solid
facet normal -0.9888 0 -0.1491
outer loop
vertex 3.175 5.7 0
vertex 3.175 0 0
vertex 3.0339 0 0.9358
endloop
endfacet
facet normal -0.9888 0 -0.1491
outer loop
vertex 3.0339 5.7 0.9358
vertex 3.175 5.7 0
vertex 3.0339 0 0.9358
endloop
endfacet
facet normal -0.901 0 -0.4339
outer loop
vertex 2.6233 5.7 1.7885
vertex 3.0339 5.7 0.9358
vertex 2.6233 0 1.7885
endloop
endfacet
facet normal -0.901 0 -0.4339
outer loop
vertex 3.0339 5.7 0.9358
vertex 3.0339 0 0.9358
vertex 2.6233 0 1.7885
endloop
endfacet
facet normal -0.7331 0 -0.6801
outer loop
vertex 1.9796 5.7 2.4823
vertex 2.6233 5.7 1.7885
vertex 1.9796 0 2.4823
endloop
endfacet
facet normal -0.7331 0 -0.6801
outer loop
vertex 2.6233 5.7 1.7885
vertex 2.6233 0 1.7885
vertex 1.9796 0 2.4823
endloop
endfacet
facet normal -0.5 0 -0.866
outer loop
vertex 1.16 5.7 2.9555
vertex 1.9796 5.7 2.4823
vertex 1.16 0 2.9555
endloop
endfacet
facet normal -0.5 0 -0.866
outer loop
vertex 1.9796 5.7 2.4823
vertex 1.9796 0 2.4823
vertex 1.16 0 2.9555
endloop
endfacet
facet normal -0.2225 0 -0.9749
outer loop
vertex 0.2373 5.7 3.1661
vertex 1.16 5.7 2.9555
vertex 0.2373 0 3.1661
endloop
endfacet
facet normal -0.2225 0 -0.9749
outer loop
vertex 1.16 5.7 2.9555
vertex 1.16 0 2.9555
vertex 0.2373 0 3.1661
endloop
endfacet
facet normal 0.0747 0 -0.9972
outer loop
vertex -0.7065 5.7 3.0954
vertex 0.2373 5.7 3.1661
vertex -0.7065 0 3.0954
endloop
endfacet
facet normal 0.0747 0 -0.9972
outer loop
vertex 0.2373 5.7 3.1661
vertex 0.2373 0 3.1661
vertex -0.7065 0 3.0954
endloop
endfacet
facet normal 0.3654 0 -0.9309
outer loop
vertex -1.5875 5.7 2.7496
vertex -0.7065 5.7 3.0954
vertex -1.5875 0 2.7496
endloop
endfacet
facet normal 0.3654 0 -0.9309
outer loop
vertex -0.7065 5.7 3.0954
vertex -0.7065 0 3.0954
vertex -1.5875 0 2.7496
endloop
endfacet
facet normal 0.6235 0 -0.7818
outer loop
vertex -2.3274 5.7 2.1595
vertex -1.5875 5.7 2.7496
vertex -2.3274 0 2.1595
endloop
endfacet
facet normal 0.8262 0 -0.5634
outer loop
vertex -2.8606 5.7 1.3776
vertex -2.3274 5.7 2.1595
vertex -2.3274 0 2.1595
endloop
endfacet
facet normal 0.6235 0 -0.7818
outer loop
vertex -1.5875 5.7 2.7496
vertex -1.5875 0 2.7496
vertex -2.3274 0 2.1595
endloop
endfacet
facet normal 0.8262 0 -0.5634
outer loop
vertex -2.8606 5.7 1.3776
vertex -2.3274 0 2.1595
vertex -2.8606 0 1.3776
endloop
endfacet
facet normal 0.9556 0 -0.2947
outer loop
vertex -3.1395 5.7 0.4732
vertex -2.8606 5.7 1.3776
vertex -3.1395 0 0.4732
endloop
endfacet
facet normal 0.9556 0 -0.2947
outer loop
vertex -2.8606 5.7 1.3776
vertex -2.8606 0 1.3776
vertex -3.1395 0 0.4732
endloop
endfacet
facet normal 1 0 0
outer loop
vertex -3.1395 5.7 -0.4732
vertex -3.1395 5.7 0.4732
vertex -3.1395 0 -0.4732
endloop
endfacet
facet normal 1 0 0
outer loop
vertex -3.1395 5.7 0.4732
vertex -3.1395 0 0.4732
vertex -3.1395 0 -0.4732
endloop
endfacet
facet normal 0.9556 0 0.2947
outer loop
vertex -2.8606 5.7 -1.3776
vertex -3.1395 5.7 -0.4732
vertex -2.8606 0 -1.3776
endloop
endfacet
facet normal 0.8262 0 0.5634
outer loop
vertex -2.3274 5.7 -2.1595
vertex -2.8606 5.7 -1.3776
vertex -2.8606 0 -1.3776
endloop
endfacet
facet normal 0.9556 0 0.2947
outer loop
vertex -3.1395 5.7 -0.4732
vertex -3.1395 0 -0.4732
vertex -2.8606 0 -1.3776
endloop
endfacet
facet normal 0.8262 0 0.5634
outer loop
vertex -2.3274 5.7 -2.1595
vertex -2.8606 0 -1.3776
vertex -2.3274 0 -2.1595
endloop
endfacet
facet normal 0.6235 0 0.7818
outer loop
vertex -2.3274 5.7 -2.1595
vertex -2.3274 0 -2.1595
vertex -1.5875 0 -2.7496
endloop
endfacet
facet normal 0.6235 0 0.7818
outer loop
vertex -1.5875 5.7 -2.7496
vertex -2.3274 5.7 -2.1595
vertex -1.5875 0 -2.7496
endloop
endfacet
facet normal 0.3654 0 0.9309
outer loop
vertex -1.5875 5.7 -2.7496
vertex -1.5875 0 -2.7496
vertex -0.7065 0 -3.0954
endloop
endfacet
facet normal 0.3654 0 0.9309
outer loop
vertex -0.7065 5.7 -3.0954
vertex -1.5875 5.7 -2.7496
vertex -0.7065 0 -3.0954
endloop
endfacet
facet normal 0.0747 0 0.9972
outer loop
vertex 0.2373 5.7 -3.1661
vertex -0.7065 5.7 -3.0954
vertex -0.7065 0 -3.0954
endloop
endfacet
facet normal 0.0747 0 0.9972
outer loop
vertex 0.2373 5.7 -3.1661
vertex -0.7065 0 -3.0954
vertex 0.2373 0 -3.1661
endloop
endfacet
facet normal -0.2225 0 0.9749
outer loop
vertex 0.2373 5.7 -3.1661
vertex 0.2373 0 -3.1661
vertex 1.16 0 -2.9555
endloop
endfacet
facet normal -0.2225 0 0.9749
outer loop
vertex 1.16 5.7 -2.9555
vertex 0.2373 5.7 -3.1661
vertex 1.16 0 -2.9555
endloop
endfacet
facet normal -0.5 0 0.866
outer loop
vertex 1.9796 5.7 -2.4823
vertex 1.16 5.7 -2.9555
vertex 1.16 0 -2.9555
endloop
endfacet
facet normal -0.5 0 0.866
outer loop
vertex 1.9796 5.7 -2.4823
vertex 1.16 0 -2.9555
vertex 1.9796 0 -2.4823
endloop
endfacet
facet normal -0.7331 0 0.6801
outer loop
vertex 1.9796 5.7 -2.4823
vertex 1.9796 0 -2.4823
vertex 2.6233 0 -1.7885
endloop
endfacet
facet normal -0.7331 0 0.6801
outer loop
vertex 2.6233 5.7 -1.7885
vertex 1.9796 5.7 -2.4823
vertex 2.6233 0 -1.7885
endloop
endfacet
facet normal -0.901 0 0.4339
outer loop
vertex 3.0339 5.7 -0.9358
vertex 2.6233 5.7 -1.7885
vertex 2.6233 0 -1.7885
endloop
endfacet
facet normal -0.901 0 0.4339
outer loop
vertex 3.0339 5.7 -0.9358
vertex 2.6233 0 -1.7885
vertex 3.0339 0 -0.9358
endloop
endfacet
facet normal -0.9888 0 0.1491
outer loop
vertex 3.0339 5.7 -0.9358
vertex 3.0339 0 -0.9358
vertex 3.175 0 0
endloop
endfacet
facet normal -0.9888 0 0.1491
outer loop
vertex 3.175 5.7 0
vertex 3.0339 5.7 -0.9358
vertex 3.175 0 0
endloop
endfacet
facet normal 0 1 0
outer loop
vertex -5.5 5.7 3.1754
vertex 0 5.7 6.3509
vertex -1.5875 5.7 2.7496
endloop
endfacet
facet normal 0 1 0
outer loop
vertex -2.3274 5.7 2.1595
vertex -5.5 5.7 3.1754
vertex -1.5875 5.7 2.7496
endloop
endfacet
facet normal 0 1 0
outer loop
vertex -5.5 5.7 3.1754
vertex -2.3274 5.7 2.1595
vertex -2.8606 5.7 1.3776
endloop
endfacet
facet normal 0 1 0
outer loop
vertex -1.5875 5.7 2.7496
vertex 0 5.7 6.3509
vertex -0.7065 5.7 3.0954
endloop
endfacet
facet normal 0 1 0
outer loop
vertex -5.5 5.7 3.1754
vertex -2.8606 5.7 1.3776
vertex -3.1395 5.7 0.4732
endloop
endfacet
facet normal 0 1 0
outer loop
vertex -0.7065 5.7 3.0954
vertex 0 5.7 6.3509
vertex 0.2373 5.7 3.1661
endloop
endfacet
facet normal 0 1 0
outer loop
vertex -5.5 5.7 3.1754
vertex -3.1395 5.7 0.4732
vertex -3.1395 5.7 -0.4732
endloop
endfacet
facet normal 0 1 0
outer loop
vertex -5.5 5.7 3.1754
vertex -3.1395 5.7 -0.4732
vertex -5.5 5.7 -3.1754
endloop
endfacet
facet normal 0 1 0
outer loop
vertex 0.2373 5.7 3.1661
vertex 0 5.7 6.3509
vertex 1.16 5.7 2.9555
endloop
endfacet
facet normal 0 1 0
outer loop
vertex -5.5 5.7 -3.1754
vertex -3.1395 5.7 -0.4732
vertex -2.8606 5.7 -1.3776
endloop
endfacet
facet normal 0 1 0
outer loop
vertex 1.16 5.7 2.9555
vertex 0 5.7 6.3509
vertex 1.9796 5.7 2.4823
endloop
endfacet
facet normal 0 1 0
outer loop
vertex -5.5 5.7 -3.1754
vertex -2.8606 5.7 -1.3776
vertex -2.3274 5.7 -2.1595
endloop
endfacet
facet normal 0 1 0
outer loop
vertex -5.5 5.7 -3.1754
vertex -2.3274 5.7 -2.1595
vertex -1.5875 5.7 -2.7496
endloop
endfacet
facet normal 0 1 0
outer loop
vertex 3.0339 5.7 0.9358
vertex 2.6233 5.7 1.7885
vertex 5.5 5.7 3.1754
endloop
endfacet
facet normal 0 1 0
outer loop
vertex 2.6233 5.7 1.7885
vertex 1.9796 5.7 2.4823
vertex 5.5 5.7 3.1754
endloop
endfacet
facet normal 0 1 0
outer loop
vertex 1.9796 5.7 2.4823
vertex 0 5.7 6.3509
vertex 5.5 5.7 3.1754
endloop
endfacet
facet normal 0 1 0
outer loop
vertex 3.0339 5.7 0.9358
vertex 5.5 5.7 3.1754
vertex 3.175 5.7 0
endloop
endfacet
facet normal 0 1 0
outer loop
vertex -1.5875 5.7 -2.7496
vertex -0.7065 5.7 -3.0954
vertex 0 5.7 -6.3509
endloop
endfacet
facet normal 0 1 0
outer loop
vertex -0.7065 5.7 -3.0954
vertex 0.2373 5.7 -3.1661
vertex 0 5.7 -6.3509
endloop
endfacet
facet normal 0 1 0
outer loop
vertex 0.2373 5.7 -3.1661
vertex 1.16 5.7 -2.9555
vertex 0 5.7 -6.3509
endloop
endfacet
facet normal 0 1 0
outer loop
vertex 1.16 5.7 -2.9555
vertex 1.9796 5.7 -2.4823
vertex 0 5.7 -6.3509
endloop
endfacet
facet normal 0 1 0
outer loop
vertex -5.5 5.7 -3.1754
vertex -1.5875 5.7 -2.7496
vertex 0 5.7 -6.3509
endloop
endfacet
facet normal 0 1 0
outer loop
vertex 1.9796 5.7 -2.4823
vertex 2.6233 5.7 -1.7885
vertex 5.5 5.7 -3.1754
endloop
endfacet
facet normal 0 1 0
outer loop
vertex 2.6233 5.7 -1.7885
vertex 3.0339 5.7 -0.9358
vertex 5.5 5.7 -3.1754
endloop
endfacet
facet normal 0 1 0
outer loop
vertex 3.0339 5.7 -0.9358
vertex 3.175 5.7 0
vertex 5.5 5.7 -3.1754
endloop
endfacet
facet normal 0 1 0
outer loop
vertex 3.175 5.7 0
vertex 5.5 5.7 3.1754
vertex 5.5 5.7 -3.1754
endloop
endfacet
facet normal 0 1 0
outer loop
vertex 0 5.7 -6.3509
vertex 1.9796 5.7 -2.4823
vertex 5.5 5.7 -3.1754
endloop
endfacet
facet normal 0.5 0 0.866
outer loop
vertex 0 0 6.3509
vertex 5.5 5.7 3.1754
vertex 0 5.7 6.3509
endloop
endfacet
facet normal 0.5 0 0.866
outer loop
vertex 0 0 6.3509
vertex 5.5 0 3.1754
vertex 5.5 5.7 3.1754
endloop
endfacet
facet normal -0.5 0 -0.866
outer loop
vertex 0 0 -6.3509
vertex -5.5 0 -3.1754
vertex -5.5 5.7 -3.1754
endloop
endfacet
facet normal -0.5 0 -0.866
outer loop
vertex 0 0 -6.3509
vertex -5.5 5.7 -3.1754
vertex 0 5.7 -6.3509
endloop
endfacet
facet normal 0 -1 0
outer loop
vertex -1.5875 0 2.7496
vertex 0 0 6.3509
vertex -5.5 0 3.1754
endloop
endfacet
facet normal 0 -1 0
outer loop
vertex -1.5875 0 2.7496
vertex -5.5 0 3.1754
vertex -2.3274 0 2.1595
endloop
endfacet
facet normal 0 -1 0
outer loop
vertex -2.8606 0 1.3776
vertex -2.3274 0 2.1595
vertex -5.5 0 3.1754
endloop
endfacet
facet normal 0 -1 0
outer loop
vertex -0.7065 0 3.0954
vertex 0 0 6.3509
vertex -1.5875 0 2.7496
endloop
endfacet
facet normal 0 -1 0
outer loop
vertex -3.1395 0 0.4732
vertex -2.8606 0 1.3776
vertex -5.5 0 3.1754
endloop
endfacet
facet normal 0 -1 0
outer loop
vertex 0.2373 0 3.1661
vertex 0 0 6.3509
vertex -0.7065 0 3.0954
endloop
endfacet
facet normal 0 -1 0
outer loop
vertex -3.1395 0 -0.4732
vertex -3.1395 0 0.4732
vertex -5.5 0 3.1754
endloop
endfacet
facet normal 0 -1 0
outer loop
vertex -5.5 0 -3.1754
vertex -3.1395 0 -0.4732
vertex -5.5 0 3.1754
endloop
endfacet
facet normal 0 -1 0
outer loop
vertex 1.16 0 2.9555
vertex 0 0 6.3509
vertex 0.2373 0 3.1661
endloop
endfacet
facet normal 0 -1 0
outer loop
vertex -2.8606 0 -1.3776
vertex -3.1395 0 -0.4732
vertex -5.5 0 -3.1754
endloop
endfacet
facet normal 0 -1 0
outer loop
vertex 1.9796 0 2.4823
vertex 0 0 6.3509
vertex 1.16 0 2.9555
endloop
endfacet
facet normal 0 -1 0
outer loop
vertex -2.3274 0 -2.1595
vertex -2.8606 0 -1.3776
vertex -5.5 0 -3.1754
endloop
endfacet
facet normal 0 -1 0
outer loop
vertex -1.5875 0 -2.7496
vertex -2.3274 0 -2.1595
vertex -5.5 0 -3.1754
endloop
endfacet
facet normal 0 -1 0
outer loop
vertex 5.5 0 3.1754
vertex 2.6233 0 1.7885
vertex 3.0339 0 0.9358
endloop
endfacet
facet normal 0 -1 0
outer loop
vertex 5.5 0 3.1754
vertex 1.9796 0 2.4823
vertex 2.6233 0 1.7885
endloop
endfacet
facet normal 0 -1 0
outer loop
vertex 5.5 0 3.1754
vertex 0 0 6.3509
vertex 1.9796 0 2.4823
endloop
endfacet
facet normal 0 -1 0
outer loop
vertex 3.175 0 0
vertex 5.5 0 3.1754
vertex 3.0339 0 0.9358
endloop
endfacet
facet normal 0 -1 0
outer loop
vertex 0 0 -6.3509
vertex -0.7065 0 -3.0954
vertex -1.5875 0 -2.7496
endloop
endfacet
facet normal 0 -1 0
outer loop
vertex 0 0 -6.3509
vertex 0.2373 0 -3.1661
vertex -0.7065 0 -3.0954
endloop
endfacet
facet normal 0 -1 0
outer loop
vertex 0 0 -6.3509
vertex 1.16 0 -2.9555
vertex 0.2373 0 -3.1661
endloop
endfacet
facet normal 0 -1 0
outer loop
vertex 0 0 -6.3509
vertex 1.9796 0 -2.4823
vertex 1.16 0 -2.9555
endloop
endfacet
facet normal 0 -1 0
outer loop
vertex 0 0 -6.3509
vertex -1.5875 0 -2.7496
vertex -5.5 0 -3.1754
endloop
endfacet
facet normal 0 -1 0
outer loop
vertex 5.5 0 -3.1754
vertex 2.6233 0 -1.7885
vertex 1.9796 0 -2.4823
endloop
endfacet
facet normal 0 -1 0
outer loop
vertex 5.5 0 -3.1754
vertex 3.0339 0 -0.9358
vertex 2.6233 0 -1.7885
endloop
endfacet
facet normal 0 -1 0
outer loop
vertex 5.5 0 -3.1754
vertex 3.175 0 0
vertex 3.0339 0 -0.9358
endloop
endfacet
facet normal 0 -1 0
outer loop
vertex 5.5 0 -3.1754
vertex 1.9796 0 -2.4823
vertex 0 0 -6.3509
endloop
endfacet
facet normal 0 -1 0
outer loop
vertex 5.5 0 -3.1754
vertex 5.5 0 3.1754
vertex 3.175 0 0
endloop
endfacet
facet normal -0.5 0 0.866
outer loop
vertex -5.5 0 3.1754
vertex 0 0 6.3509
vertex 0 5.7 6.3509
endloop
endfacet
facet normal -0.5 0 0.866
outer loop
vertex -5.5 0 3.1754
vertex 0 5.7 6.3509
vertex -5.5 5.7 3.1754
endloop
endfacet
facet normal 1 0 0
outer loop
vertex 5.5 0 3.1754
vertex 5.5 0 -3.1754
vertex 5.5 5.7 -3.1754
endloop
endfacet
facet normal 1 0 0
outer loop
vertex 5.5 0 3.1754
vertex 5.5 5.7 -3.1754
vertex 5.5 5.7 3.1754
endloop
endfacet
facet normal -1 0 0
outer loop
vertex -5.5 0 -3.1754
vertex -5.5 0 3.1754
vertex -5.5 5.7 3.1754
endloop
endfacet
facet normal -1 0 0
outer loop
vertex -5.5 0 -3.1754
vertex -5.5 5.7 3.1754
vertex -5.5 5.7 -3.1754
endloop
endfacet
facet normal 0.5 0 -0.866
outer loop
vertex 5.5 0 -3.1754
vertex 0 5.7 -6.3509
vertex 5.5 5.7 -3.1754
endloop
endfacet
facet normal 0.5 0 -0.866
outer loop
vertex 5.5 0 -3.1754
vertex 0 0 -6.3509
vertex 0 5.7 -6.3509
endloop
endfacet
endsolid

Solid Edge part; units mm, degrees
sketch "Sketch1" plane through (0, 0, 0) normal (0, -1, 0) x (1, 0, 0)
  line L0 (5.5, 3.1754) -> (0, 6.3509)
  line L1 (0, 6.3509) -> (-5.5, 3.1754)
  line L2 (-5.5, 3.1754) -> (-5.5, -3.1754)
  line L3 (-5.5, -3.1754) -> (0, -6.3509)
  line L4 (0, -6.3509) -> (5.5, -3.1754)
  line L5 (5.5, -3.1754) -> (5.5, 3.1754)
  circle A0 centre (0, 0) radius 3.175
extrude "Protrusion1" add sketch "Sketch1" against normal blind 5.7
